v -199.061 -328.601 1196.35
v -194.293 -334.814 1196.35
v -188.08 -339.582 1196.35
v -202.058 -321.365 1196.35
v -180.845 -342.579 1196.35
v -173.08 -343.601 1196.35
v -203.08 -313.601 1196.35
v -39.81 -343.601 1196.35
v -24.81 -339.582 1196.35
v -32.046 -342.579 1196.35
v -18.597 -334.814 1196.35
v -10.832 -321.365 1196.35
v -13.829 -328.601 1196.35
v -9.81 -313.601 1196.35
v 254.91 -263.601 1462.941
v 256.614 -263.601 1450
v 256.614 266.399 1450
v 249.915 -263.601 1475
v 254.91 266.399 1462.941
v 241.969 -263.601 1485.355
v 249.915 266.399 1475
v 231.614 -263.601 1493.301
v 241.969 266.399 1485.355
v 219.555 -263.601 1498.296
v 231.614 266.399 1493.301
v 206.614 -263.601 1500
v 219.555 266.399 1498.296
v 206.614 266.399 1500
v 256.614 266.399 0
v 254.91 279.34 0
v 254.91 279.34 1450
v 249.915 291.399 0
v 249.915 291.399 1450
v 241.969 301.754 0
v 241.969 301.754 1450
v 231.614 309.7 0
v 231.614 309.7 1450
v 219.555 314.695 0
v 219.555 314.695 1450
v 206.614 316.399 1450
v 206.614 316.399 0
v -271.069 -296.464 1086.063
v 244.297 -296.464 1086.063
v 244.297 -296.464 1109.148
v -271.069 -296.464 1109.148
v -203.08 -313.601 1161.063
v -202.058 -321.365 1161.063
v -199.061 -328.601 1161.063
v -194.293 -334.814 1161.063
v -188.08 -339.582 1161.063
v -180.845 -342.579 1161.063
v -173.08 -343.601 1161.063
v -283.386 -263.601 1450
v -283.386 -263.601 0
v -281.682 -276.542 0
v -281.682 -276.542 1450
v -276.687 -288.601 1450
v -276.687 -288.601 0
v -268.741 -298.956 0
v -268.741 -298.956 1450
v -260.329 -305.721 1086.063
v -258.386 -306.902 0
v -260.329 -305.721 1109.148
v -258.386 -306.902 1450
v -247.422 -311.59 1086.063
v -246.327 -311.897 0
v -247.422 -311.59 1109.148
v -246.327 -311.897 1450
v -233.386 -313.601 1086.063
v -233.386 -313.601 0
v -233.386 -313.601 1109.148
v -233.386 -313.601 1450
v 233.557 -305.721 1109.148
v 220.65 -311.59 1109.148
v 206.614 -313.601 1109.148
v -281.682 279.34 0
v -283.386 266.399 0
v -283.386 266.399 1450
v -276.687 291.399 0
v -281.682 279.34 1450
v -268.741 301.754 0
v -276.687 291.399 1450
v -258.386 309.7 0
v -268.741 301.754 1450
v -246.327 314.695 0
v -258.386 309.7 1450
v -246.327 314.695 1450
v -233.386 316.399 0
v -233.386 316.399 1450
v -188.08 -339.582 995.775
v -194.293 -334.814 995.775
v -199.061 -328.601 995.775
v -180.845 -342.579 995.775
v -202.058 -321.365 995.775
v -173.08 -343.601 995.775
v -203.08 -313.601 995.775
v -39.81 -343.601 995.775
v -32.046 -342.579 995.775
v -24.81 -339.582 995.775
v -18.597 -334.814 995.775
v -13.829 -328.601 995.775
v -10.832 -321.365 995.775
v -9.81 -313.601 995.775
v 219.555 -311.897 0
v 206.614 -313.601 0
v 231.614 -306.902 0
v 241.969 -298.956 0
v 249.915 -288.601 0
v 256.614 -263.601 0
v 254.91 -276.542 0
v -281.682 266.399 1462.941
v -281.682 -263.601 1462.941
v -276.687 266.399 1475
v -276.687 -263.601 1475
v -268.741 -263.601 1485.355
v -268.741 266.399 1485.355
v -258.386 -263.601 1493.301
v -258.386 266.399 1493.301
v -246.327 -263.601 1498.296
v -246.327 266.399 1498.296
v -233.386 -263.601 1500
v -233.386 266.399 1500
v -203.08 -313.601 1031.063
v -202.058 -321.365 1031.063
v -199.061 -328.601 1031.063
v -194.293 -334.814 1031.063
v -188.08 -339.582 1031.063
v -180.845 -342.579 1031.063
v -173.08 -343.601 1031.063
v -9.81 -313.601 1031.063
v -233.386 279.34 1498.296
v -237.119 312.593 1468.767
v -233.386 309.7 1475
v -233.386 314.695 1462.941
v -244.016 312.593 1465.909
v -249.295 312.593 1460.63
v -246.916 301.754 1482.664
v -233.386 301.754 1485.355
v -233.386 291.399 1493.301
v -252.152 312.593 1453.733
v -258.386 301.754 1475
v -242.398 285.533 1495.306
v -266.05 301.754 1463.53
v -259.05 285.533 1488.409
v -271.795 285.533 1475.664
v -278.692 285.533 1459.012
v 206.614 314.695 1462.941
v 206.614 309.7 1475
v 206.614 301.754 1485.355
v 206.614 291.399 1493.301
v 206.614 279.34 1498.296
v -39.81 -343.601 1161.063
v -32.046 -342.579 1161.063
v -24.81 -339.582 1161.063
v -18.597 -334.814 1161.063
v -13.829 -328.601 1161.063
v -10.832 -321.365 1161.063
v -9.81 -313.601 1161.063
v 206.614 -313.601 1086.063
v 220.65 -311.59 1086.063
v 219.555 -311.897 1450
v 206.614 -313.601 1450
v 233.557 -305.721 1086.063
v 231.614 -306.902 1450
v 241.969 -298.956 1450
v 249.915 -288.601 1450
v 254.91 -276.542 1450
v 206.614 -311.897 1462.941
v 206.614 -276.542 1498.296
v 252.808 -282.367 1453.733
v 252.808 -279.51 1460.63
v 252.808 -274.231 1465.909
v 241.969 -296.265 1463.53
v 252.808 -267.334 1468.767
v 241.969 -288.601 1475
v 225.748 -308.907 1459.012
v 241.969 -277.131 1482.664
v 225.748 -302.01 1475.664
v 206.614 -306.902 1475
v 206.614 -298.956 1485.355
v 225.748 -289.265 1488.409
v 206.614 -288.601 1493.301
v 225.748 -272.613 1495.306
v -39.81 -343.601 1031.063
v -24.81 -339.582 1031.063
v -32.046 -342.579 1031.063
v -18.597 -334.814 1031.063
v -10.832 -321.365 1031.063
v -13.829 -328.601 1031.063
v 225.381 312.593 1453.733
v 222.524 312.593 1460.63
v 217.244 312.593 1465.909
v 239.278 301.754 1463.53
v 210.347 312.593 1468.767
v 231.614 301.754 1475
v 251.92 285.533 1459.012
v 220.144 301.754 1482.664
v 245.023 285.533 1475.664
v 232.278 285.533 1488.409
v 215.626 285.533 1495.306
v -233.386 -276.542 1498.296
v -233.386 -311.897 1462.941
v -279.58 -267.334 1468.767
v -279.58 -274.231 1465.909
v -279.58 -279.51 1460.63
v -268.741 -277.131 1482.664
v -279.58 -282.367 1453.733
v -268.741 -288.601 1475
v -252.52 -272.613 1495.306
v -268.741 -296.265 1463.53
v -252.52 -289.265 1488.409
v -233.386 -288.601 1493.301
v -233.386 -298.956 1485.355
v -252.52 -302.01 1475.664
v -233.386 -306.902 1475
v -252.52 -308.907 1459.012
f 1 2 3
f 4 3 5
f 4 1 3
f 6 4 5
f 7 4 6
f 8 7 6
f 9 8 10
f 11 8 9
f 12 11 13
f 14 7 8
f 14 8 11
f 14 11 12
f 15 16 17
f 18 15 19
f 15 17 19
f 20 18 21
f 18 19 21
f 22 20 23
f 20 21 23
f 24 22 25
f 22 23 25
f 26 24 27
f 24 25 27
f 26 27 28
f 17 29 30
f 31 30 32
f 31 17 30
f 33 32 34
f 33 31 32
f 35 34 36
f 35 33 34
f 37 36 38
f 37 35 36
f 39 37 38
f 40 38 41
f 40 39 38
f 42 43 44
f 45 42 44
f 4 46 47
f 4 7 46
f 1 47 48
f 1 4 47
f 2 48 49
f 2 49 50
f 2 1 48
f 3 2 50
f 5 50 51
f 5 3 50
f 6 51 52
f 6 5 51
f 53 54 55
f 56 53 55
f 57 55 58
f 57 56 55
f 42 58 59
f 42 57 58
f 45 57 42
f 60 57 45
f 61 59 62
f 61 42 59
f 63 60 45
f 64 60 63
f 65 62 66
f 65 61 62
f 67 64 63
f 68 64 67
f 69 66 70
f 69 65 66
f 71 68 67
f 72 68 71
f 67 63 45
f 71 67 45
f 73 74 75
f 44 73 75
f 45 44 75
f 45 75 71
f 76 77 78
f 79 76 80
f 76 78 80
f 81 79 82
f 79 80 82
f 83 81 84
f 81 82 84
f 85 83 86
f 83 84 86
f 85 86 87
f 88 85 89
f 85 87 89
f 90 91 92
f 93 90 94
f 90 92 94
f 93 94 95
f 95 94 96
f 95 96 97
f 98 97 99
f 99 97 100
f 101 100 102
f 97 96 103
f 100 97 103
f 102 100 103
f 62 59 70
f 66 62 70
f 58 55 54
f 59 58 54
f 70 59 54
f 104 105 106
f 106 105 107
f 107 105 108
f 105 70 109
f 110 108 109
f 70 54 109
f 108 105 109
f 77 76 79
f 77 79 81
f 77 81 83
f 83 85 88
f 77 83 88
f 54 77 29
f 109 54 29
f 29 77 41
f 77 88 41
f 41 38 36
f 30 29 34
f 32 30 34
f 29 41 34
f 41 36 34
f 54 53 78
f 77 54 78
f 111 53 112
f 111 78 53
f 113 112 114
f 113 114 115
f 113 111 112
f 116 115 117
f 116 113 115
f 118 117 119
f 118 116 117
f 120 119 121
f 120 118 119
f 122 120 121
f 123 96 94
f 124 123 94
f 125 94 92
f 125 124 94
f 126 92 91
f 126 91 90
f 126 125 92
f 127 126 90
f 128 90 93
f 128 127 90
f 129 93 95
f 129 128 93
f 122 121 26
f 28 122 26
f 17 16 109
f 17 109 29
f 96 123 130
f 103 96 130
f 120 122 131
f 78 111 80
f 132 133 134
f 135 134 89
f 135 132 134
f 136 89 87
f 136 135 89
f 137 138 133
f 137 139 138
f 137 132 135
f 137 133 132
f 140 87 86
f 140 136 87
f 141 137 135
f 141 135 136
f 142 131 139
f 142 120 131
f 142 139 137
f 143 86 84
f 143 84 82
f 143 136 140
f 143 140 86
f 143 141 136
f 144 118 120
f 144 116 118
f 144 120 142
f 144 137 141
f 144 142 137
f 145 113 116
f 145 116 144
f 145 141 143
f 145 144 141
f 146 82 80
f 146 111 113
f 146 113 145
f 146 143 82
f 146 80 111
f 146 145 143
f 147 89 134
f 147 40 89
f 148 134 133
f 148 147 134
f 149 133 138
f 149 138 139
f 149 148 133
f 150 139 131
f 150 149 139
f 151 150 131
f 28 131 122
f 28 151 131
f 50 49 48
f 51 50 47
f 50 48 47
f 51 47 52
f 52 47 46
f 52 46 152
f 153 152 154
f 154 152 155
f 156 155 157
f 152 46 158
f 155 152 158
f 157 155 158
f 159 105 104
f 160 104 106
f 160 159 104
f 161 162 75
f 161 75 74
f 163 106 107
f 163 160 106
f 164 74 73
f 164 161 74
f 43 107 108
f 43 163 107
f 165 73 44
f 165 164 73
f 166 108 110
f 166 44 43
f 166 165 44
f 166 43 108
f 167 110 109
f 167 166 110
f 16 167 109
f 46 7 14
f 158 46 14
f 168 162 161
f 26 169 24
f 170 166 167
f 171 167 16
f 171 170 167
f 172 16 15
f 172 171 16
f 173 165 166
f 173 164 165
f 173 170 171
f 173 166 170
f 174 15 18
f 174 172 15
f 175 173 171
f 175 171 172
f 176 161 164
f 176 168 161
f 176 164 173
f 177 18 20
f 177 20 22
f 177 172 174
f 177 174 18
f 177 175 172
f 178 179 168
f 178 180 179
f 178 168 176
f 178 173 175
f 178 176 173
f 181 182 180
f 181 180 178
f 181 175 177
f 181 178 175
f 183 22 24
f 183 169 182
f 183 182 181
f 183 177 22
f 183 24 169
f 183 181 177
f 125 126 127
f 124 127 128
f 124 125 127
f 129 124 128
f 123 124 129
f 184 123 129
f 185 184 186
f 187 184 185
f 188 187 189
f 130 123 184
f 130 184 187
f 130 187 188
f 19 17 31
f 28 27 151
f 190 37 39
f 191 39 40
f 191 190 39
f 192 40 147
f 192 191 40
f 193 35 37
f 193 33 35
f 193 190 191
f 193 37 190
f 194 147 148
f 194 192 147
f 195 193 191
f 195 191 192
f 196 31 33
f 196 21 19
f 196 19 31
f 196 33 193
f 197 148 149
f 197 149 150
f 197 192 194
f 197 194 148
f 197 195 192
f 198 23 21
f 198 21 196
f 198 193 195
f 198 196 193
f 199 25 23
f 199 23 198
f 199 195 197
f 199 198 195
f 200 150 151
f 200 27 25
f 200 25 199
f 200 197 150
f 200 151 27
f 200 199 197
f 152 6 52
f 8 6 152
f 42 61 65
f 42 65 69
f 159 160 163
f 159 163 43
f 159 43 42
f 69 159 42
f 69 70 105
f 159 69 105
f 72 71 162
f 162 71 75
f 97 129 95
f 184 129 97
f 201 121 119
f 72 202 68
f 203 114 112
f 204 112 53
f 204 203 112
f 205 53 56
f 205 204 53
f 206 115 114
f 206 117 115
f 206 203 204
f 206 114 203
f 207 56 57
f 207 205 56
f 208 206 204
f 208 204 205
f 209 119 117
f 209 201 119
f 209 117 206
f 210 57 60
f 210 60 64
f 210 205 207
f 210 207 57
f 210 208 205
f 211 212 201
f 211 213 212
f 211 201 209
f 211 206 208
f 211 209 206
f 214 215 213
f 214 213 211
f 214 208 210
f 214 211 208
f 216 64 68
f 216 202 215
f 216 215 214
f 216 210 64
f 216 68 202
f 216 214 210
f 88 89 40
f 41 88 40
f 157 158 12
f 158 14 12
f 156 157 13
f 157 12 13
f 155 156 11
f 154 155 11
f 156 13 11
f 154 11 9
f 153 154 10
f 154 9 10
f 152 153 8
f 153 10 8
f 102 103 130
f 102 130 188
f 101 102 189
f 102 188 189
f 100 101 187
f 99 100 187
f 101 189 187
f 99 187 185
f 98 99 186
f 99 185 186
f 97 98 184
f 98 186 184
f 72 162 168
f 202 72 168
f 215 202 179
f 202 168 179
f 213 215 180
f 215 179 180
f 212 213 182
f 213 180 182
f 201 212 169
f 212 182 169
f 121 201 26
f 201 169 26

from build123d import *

# Parameters (mm, degrees)
F0_W     = 540
F0_H     = 630
F1_DEPTH = 1500
F2_R     = 50
F3_W     = 42.1213209629
F3_H     = 23.0853557587
F4_DEPTH = 1000
F5_W     = 193.2697791798
F5_H     = 35.2874994278
F6_DEPTH = 30
F7_R     = 29.99999
F7_2_R   = 29.99999


# Not quite as in the source:
# - a fillet or chamfer is up to 0.001 mm smaller than in the source, because OpenCascade refuses the exact size


with BuildPart() as f1:
    # F0 (on Top) → F1 (new body)
    with BuildSketch(Plane.XY):
        with Locations((-13.3859050655, 1.3991128653)):
            Rectangle(F0_W, F0_H)
    extrude(amount=F1_DEPTH)

    # F2
    f2_edges = [f1.edges().sort_by_distance(p)[0] for p in [
        (-13.385905, -313.600887, 1500),
        (-283.385905, 1.399113, 1500),
        (-283.385905, -313.600887, 750),
        (256.614095, -313.600887, 750),
        (256.614095, 1.399113, 1500),
        (256.614095, 316.399113, 750),
        (-13.385905, 316.399113, 1500),
        (-283.385905, 316.399113, 750),
    ]]
    fillet(f2_edges, radius=F2_R)

    # F3 (on face) → F4 (cut)
    with BuildSketch(Plane.YZ.offset(256.6140949345)):
        with Locations((-317.5243586302, 1097.6054668427)):
            Rectangle(F3_W, F3_H)
    extrude(amount=-F4_DEPTH, mode=Mode.SUBTRACT)


with BuildPart() as f6:
    # F5 (on face) → F6 (new body)
    with BuildSketch(Plane.XZ.offset(313.6008871347)):
        with Locations((-106.4450343975, 1178.7065386772)):
            Rectangle(F5_W, F5_H)
    extrude(amount=F6_DEPTH)

    # F7 (radius 30 in the source; OpenCascade refuses exactly that, so slightly less here)
    f7_edges = [f6.edges().sort_by_distance(p)[0] for p in [
        (-203.079924, -343.600887, 1178.706539),
        (-9.810145, -343.600887, 1178.706539),
    ]]
    fillet(f7_edges, radius=F7_R)


with BuildPart() as f6b:
    # F5 (on face) → F6, piece 2 (new body)
    with BuildSketch(Plane.XZ.offset(313.6008871347)):
        with Locations((-106.4450343975, 1013.4190392494)):
            Rectangle(F5_W, F5_H)
    extrude(amount=F6_DEPTH)

    # F7#2 (radius 30 in the source; OpenCascade refuses exactly that, so slightly less here)
    f7_2_edges = [f6b.edges().sort_by_distance(p)[0] for p in [
        (-203.079924, -343.600887, 1013.419039),
        (-9.810145, -343.600887, 1013.419039),
    ]]
    fillet(f7_2_edges, radius=F7_2_R)


solid = Compound([f1.part, f6.part, f6b.part])
